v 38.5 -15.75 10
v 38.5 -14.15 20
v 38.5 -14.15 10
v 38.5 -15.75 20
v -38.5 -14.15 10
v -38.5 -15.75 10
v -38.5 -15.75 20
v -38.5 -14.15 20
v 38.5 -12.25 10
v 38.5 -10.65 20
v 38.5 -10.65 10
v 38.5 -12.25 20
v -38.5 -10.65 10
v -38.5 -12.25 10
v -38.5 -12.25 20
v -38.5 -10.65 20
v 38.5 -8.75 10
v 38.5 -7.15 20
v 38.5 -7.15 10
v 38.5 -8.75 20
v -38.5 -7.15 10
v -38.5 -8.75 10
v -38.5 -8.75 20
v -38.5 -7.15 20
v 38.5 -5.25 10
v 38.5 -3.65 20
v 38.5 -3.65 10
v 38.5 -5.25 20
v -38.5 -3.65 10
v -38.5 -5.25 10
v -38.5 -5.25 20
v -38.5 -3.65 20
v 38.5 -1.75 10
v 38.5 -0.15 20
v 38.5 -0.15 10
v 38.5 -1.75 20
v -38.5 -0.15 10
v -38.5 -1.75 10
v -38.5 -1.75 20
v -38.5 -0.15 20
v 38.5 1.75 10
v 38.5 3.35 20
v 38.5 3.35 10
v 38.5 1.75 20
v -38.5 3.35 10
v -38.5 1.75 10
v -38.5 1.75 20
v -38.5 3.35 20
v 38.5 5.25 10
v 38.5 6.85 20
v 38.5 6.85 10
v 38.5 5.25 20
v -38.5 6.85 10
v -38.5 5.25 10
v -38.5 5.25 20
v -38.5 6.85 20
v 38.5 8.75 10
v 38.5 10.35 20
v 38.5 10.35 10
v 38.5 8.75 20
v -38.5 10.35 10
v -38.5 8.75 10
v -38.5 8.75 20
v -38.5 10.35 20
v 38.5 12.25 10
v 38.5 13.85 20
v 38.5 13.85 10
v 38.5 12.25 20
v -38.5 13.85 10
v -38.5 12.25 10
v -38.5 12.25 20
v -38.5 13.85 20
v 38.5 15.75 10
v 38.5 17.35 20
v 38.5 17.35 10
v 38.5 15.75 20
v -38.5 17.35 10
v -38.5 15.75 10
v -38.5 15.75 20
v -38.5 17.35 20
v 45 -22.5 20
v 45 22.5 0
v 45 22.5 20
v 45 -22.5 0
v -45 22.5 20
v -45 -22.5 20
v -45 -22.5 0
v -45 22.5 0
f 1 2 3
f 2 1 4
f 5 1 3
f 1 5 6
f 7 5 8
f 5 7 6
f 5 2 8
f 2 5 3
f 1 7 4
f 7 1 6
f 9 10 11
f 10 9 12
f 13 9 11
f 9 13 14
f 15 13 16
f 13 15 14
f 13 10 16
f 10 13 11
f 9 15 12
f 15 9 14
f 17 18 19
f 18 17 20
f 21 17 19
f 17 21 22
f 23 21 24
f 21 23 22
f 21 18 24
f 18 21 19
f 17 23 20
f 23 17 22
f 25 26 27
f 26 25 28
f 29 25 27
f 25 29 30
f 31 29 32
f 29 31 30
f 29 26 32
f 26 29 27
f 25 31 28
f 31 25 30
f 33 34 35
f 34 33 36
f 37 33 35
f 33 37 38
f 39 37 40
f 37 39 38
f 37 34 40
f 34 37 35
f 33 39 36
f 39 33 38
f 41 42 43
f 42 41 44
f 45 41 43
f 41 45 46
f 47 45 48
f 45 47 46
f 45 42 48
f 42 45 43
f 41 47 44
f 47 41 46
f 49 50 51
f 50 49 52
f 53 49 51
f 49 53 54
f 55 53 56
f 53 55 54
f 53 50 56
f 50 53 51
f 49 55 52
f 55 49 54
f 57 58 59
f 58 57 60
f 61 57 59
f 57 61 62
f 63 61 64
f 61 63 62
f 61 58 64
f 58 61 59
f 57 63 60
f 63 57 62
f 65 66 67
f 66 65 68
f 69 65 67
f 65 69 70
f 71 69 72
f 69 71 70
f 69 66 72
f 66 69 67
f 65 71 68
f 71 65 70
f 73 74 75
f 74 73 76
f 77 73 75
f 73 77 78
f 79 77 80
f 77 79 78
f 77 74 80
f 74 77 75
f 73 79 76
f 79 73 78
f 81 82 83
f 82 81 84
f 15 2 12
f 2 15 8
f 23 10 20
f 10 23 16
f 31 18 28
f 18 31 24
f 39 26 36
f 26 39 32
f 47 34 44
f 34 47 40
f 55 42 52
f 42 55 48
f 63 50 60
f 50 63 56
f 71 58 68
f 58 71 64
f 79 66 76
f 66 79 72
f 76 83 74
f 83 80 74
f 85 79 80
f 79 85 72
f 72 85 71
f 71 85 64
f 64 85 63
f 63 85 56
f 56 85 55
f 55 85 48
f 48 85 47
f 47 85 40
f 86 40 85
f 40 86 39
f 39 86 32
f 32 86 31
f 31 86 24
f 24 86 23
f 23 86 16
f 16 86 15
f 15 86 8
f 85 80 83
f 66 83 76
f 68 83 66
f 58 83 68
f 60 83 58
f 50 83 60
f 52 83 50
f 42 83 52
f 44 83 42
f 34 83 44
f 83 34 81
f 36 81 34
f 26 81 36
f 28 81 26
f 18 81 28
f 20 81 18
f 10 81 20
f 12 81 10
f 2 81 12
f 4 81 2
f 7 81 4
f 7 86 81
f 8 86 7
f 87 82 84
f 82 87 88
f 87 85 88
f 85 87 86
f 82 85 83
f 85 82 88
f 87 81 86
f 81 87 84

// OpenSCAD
// Slide drying rack - holds 10 microscope slides (75 x 25 x 1 mm) upright on their long edge
// Print orientation: base block on the bed, slots open upward (+Z)

// ---------- Parameters ----------
base_len      = 90;    // base block length along X
base_wid      = 45;    // base block width along Y
base_ht       = 20;    // base block height along Z

slot_len      = 77;    // slot length along X
slot_w        = 1.6;   // slot width along Y
slot_depth    = 10;    // slot depth into the block (from top face)
slot_count    = 10;    // number of slots
slot_pitch    = 3.5;   // centre-to-centre slot spacing along Y

eps           = 0.5;   // cutter overshoot past the top face

$fn = 96;

// ---------- Model ----------
difference() {
    // Solid base block, centred in X and Y, resting on z = 0
    translate([-base_len/2, -base_wid/2, 0])
        cube([base_len, base_wid, base_ht]);

    // Row of parallel slots, centred on the block in X and Y
    for (i = [0 : slot_count - 1]) {
        y_c = (i - (slot_count - 1)/2) * slot_pitch;
        translate([-slot_len/2, y_c, base_ht - slot_depth])
            cube([slot_len, slot_w, slot_depth + eps]);
    }
}
